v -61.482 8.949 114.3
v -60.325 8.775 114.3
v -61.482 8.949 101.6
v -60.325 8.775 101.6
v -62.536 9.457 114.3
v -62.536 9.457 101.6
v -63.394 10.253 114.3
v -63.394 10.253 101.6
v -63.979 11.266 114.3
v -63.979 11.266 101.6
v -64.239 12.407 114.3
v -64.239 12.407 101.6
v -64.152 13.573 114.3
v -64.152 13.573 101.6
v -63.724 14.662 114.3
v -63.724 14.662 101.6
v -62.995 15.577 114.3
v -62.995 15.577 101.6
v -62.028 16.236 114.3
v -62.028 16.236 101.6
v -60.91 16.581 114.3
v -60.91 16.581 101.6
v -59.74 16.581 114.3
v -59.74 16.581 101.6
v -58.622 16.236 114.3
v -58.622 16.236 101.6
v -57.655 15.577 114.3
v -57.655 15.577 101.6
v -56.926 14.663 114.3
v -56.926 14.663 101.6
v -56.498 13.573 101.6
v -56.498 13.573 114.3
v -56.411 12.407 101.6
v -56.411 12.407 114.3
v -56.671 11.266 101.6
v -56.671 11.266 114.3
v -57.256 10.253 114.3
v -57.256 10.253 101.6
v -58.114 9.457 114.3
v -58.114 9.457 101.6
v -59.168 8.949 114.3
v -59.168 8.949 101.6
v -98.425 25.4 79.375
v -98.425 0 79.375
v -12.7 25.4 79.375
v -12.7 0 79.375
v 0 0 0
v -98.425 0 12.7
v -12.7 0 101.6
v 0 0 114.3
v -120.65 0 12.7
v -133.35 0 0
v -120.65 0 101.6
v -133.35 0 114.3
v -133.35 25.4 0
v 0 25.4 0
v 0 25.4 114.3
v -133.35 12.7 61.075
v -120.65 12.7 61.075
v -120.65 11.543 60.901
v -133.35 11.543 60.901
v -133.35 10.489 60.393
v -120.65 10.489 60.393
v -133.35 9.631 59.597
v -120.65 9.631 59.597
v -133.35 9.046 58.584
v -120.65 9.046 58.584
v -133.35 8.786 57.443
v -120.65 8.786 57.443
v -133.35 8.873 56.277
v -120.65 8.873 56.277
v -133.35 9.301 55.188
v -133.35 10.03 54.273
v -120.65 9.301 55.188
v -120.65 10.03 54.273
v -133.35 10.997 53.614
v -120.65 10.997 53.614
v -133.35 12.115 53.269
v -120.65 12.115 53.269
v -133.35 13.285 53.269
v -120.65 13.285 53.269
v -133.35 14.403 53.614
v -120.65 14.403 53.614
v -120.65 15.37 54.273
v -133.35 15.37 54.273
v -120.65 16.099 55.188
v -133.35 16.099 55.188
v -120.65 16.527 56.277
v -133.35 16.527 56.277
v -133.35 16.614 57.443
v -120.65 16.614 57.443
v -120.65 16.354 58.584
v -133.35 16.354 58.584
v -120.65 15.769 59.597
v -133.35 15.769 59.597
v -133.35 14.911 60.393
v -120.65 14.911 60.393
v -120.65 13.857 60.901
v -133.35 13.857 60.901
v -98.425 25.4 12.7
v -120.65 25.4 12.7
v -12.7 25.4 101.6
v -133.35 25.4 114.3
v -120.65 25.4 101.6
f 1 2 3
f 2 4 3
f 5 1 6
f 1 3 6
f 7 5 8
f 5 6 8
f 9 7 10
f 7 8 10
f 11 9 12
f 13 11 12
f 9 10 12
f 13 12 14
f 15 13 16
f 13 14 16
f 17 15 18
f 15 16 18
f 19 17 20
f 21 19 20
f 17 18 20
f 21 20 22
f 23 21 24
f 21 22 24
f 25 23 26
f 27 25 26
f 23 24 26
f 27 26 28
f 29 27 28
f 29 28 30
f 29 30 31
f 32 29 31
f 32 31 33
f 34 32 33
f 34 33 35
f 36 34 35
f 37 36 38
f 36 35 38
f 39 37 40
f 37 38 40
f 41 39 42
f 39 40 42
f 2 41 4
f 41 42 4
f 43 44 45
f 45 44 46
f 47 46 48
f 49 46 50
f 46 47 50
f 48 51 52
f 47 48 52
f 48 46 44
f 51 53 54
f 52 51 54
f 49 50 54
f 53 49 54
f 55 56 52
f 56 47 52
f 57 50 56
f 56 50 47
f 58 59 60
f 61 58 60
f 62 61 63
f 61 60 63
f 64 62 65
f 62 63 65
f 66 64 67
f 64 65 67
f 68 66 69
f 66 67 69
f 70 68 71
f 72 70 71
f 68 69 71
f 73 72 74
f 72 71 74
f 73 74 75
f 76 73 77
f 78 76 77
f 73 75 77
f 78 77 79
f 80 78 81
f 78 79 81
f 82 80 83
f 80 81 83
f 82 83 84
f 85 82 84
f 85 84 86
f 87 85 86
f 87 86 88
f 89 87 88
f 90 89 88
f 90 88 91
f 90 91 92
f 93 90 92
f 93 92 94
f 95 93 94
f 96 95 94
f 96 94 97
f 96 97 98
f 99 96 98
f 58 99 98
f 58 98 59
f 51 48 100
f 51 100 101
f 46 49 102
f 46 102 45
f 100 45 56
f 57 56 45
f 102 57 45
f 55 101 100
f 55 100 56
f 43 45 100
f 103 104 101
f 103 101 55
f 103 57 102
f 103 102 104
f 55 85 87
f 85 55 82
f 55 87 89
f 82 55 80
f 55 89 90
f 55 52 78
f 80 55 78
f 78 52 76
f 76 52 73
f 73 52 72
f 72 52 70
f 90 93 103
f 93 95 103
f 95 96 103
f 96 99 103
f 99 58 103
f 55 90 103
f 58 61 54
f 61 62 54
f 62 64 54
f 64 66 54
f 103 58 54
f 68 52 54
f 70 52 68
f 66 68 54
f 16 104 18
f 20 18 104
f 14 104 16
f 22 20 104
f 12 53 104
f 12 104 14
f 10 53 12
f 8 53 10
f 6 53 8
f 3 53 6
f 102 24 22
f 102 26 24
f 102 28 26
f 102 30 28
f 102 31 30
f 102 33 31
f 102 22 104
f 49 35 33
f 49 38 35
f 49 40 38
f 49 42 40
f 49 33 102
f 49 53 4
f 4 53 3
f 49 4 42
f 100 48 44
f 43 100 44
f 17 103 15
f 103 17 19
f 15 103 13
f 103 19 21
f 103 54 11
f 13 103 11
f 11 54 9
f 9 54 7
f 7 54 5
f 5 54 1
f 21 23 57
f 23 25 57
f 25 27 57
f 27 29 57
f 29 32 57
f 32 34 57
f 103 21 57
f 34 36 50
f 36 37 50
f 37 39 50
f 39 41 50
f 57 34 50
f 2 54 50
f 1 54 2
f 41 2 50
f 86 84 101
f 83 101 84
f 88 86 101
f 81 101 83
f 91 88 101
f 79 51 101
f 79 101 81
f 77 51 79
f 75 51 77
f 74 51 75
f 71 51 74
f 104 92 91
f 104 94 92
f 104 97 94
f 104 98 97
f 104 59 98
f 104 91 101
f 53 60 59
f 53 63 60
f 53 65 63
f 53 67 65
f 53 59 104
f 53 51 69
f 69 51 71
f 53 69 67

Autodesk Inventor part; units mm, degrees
ref_plane "YZ Plane" through (0, 0, 0) normal (1, 0, 0) x (0, 1, 0)
ref_plane "XZ Plane" through (0, 0, 0) normal (0, 1, 0) x (-1, 0, 0)
ref_plane "XY Plane" through (0, 0, 0) normal (0, 0, 1) x (1, 0, 0)
sketch "Sketch1" plane through (0, 0, 0) normal (0, 1, 0) x (-1, 0, 0)
  line L0 (0, 0) -> (133.35, 0)
  line L1 (133.35, 0) -> (133.35, 114.3)
  line L2 (133.35, 114.3) -> (0, 114.3)
  line L3 (0, 114.3) -> (0, 0)
  line L4 (12.7, 12.7) -> (120.65, 12.7)
  line L5 (120.65, 12.7) -> (120.65, 101.6)
  line L6 (120.65, 101.6) -> (12.7, 101.6)
  line L7 (12.7, 101.6) -> (12.7, 12.7)
  line L8 (12.7, 12.7) -> (98.425, 12.7)
  line L9 (98.425, 12.7) -> (98.425, 79.375)
  line L10 (98.425, 79.375) -> (12.7, 79.375)
  line L11 (12.7, 79.375) -> (12.7, 12.7)
  dimension "d0" = 114.3
  dimension "d1" = 133.35
  dimension "d2" = 12.7
  dimension "d3" = 12.7
  dimension "d4" = 12.7
  dimension "d5" = 12.7
  dimension "d6" = 22.225
  dimension "d7" = 22.225
extrude "Extrusion1" add sketch "Sketch1" along normal blind 25.4 contours L3 L2 L1 L0 | L7 L10 L9 L4
sketch "Sketch3" plane through (-133.35, 0, 114.3) normal (0, 0, 1) x (1, 0, 0)
  line L0 (133.35, 0) -> (133.35, 25.4) projected
  line L1 (0, 25.4) -> (133.35, 25.4) projected
  line L2 (12.7, 0) -> (12.7, 25.4) projected
  point P0 (73.025, 12.7)
  dimension "d10" = 120.65
  dimension "d11" = 25.4
  dimension "d12" = 60.325
  dimension "d13" = 12.7
hole "Hole1" at (-60.325, 12.7, 114.3) direction (0, 0, -1) diameter 7.85 depth 12.7
sketch "Sketch4" plane through (-133.35, 0, 0) normal (-1, 0, 0) x (0, 0, 1)
  line L0 (0, 25.4) -> (114.3, 25.4) projected
  line L1 (114.3, 0) -> (114.3, 25.4) projected
  point P0 (0, 0)
  point P1 (57.15, 12.7)
  dimension "d21" = 25.4
  dimension "d22" = 114.3
  dimension "d23" = 12.7
  dimension "d24" = 57.15
hole "Hole2" at (-133.35, 12.7, 57.15) direction (1, 0, 0) diameter 7.85 depth 12.7
equation "\"d3\" = d2"
equation "\"d4\" = d2"
equation "\"d5\" = d2"
equation "\"d6\" = d7"
equation "\"d12\" = 0.5 * d10"
equation "\"d13\" = 0.5 * d11"
equation "\"d23\" = 0.5 * d21"
equation "\"d24\" = 0.5 * d22"
properties part number "odometery system base"
